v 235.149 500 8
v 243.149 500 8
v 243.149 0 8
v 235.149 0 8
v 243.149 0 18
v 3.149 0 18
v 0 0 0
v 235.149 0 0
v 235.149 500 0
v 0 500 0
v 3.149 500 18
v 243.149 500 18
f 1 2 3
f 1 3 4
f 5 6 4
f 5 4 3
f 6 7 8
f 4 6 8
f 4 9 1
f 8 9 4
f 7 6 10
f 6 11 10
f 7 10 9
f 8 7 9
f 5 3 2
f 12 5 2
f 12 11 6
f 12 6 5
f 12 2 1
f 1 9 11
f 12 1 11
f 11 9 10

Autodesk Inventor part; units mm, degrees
ref_plane "YZ Plane" through (0, 0, 0) normal (1, 0, 0) x (0, 1, 0)
ref_plane "XZ Plane" through (0, 0, 0) normal (0, 1, 0) x (-1, 0, 0)
ref_plane "XY Plane" through (0, 0, 0) normal (0, 0, 1) x (1, 0, 0)
sketch "Sketch1" plane through (0, 0, 0) normal (0, 0, 1) x (1, 0, 0)
  line L0 (0, 0) -> (243.149, 0)
  line L1 (243.149, 0) -> (243.149, 500)
  line L2 (243.149, 500) -> (0, 500)
  line L3 (0, 500) -> (0, 0)
  dimension "d0" = 243.149
  dimension "d1" = 500
extrude "Extrusion1" add sketch "Sketch1" along normal blind 18
sketch "Sketch2" plane through (0, 0, 0) normal (0, 0, -1) x (-1, 0, 0)
  line L0 (0, 0) -> (-243.149, 0) projected
  line L1 (-243.149, 500) -> (-235.149, 500)
  line L2 (-235.149, 500) -> (-235.149, 0)
  line L3 (-235.149, 0) -> (-243.149, 0)
  line L4 (-243.149, 0) -> (-243.149, 500)
  dimension "d4" = 8
extrude "Extrusion2" cut sketch "Sketch2" against normal blind 8
sketch "Sketch4" plane through (0, 500, 18) normal (0, 1, 0) x (1, 0, 0)
  line L0 (0, 18) -> (0, 0) projected
  line L1 (243.149, 0) -> (0, 0) projected
  line L2 (0, 0) -> (3.1489, 0)
  line L3 (0, 18) -> (0, 0)
  line L4 (3.1489, 0) -> (0, 18)
  dimension "d11" = 9.923
extrude "Extrusion4" cut sketch "Sketch4" against normal up to next
properties part number "regalboden"
